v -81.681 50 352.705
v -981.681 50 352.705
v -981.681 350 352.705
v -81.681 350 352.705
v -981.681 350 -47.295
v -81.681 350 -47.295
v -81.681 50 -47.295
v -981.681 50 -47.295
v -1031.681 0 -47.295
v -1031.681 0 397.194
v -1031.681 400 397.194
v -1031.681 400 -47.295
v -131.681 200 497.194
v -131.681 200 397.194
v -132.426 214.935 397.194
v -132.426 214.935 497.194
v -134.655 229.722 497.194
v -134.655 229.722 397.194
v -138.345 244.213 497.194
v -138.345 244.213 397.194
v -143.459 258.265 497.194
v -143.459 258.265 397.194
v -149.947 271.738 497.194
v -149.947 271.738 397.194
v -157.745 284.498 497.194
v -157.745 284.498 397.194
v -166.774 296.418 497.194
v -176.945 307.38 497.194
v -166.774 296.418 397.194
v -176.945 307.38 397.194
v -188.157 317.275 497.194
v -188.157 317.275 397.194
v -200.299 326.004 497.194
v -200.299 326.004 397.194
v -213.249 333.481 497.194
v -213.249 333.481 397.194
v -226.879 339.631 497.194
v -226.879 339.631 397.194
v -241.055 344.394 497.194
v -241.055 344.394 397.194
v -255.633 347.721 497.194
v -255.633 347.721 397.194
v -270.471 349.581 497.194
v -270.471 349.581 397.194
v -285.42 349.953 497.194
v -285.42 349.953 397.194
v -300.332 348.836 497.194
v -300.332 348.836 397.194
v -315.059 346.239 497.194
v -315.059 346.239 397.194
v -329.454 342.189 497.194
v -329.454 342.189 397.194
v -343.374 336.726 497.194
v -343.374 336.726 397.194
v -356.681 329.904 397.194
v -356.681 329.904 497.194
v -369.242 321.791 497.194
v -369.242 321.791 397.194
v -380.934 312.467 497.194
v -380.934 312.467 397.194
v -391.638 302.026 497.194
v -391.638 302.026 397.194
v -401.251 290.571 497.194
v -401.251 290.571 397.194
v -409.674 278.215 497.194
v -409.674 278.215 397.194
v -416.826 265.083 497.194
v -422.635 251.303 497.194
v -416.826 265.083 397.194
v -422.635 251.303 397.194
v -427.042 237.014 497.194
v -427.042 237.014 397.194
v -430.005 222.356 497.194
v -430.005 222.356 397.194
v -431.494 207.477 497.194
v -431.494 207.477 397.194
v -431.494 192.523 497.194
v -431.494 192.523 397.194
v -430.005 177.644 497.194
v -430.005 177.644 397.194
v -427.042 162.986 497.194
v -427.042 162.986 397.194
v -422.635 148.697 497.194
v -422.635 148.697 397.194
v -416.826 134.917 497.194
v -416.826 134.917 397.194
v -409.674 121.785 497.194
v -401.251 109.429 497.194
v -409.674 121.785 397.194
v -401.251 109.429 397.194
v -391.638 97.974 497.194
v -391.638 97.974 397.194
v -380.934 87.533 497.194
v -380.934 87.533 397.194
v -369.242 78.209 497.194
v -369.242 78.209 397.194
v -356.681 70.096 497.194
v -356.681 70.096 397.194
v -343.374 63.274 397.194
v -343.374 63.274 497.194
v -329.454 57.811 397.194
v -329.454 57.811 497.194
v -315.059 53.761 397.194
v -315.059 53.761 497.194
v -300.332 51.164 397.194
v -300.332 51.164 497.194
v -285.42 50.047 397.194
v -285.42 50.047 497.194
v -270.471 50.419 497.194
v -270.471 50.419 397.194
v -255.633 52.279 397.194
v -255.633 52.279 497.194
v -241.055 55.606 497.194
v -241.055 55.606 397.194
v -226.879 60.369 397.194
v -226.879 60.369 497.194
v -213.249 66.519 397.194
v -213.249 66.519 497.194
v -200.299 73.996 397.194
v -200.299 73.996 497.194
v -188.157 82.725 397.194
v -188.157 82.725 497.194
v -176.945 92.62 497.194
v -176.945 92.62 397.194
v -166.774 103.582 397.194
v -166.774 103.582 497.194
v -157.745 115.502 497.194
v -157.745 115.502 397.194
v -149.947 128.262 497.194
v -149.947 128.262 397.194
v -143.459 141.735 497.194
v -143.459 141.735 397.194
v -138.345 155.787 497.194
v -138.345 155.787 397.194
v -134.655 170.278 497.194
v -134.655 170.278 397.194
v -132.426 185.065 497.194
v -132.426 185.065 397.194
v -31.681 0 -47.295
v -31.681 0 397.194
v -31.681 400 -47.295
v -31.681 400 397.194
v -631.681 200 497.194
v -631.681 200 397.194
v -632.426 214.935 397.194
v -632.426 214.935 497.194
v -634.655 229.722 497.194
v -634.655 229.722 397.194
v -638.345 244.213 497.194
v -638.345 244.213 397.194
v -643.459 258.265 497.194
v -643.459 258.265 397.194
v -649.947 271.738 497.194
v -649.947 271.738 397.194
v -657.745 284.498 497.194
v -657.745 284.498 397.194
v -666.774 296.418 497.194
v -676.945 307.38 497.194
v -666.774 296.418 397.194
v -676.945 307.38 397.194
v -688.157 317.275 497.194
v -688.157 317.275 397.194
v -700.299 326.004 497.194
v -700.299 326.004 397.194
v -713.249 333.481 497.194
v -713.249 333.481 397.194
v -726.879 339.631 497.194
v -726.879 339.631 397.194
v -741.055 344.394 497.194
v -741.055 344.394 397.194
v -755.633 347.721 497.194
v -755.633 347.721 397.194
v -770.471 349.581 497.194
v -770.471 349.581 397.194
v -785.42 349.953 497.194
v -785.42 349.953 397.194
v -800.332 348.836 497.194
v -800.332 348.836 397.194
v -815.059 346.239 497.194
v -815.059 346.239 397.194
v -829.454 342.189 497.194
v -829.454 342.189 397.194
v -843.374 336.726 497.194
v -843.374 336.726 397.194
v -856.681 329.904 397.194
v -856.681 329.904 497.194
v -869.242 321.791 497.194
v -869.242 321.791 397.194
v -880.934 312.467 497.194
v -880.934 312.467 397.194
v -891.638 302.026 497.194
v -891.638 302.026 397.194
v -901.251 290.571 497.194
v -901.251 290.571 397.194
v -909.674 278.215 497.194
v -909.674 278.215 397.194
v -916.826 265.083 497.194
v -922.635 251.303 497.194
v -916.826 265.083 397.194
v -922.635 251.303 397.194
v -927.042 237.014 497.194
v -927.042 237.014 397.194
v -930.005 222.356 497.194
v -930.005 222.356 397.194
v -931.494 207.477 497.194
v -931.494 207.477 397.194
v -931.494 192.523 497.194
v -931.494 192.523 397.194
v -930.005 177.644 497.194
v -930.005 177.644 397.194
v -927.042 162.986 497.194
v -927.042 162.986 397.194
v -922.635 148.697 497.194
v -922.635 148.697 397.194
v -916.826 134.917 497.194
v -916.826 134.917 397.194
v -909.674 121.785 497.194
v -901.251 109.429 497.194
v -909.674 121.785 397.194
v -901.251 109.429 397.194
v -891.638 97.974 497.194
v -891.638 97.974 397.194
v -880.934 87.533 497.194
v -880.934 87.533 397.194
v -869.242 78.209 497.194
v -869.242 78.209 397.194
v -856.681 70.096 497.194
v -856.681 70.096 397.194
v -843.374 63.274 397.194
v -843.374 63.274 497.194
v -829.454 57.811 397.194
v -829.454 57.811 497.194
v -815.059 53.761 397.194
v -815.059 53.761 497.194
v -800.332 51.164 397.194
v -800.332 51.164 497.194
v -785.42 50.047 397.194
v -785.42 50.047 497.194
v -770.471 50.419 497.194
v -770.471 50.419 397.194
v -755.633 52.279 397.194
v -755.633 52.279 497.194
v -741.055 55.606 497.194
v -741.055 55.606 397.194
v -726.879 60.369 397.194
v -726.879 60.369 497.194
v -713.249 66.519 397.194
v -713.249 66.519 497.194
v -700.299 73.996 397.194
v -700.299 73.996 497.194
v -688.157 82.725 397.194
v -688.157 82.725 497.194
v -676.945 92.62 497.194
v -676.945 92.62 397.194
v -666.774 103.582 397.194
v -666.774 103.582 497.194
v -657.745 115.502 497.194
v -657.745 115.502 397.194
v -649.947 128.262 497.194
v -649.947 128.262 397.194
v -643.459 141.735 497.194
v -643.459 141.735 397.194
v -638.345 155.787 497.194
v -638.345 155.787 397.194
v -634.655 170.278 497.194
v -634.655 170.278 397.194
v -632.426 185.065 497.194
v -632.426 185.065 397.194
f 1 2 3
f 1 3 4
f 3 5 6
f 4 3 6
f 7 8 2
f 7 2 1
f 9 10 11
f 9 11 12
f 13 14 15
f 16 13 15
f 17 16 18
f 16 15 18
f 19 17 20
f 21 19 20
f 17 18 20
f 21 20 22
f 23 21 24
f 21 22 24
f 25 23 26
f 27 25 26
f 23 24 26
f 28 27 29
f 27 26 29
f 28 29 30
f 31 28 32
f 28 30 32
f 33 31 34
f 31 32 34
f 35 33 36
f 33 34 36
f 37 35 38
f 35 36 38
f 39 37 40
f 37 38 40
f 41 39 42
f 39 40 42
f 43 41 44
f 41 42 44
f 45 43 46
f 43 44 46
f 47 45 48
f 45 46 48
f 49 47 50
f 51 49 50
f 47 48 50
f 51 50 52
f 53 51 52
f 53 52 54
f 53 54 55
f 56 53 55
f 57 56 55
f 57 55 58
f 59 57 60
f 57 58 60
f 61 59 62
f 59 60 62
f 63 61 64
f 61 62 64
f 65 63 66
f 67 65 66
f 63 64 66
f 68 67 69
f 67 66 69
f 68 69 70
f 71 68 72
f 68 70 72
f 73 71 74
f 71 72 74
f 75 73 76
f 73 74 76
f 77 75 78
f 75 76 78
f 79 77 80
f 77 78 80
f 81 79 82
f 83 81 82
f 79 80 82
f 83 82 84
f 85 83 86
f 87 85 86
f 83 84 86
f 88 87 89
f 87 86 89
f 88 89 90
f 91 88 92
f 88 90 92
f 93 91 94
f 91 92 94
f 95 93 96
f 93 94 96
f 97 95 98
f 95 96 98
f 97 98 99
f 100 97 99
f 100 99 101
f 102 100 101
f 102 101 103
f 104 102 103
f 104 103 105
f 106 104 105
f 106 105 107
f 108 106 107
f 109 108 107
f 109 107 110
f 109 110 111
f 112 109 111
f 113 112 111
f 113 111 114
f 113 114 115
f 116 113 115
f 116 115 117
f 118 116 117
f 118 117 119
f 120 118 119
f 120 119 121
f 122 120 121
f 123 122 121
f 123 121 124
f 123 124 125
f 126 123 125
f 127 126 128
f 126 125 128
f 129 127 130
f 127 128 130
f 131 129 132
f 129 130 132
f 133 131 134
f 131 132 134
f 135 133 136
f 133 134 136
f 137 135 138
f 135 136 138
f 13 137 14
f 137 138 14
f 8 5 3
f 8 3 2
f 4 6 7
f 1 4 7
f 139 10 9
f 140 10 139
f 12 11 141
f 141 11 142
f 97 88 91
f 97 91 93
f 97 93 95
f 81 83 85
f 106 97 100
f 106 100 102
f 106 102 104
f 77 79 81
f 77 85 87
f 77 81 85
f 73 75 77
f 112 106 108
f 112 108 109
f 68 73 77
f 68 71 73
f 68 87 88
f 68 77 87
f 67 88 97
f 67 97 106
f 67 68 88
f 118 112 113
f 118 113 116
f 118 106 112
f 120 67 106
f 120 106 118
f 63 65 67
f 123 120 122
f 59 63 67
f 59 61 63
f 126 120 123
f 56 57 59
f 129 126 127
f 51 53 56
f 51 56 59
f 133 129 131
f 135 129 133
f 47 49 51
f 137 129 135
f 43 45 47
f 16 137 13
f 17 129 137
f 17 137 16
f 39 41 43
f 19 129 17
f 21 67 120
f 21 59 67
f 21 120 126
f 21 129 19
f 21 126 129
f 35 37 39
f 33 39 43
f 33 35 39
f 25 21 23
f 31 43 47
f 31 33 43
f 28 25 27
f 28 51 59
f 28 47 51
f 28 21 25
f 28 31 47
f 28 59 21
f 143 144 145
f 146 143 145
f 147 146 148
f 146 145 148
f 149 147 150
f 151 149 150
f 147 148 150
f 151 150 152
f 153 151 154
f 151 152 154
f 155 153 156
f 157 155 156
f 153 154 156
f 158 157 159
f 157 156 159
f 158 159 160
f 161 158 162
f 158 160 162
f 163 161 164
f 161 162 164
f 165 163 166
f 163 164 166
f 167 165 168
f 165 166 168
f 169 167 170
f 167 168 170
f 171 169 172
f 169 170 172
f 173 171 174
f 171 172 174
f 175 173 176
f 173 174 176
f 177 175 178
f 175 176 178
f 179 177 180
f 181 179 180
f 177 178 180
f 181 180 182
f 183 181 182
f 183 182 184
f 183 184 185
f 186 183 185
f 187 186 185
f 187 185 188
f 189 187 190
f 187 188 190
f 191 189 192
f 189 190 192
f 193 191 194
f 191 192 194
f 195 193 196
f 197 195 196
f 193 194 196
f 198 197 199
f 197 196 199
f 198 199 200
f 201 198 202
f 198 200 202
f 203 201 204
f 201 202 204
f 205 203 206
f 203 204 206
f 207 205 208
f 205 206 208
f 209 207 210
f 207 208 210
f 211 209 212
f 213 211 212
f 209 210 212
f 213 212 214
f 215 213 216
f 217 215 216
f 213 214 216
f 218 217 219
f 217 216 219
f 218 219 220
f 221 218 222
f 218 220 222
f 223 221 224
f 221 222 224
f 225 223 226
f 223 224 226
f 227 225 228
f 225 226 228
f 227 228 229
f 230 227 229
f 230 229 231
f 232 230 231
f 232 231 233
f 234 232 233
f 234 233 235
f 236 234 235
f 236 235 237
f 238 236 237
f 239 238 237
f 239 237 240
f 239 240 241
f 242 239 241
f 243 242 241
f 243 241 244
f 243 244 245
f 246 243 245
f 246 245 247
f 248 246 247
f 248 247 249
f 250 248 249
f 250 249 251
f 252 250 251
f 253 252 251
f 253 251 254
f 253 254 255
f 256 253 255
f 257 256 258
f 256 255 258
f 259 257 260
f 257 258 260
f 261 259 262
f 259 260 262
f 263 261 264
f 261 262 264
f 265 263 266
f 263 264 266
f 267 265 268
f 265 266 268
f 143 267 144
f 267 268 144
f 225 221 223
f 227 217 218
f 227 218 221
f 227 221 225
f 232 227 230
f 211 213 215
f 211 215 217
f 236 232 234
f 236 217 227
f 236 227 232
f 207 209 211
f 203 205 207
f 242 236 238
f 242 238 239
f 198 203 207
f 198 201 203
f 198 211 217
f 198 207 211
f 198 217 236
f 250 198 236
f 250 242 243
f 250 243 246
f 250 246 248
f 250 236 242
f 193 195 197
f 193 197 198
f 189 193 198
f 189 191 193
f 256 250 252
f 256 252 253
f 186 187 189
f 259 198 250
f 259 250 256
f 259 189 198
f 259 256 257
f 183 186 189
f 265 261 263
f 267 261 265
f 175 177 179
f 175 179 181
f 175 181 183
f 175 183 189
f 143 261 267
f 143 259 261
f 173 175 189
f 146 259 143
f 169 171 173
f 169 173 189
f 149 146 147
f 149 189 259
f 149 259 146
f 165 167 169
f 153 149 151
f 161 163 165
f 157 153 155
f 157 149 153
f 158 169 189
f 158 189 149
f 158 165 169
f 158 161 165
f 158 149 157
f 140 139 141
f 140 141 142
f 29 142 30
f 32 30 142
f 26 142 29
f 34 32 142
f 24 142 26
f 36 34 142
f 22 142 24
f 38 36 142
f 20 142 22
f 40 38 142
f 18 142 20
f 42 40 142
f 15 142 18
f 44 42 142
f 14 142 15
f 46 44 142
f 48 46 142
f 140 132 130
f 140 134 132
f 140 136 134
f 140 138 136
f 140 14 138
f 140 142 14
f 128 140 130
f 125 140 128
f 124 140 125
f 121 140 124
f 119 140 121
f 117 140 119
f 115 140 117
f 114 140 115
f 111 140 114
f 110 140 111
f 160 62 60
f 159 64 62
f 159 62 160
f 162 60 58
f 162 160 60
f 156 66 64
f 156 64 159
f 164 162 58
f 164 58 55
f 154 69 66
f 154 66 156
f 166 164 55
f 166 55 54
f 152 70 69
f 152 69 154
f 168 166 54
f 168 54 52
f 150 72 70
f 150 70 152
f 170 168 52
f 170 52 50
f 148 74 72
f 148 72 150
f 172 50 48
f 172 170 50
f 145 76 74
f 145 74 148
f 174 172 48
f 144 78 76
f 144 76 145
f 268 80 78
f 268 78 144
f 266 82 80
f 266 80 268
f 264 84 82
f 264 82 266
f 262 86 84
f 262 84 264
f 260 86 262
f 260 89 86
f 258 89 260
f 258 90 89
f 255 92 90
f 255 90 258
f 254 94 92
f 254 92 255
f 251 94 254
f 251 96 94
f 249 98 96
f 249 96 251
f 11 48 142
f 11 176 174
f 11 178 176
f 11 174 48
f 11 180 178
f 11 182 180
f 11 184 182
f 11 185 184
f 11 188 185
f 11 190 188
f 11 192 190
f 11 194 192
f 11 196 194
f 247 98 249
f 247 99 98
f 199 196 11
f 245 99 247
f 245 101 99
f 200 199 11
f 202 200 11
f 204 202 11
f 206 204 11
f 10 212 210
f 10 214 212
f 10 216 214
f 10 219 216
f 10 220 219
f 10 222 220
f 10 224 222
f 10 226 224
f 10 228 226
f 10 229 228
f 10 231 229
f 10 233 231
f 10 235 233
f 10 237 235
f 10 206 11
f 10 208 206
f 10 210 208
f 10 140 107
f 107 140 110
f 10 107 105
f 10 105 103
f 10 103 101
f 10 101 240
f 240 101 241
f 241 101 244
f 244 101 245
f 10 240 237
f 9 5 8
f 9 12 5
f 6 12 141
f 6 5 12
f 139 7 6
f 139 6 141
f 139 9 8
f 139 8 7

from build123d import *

# Parameters (mm, degrees)
F1_DEPTH = 400
F2_R     = 150
F3_DEPTH = 100
F4_W     = 900
F4_H     = 300
F5_DEPTH = 400


with BuildPart() as f1:
    # F0 (on Front) → F1 (new body)
    with BuildSketch(Plane.XZ):
        Polygon((-931.680651, 397.194484), (-1031.680651, 397.194484), (-1031.680651, -2.805516), (-1031.680651, -47.295272), (-31.680651, -47.295272), (-31.680651, 52.704728), (-31.680651, 397.194484), (-131.680651, 397.194484), (-431.680651, 397.194484), (-631.680651, 397.194484), align=None)
    extrude(amount=-F1_DEPTH)

    # F2 (on face) → F3 (join)
    with BuildSketch(Plane.XY.offset(397.194484)):
        with Locations((-781.680651, 200)):
            Circle(F2_R)
        with Locations((-281.680651, 200)):
            Circle(F2_R)
    extrude(amount=F3_DEPTH)

    # F4 (on face) → F5 (cut)
    with BuildSketch(Plane(origin=(0, 0, -47.295272), x_dir=(1, 0, 0), z_dir=(0, 0, -1))):
        with Locations((-531.680651, -200)):
            Rectangle(F4_W, F4_H)
    extrude(amount=-F5_DEPTH, mode=Mode.SUBTRACT)


solid = f1.part
